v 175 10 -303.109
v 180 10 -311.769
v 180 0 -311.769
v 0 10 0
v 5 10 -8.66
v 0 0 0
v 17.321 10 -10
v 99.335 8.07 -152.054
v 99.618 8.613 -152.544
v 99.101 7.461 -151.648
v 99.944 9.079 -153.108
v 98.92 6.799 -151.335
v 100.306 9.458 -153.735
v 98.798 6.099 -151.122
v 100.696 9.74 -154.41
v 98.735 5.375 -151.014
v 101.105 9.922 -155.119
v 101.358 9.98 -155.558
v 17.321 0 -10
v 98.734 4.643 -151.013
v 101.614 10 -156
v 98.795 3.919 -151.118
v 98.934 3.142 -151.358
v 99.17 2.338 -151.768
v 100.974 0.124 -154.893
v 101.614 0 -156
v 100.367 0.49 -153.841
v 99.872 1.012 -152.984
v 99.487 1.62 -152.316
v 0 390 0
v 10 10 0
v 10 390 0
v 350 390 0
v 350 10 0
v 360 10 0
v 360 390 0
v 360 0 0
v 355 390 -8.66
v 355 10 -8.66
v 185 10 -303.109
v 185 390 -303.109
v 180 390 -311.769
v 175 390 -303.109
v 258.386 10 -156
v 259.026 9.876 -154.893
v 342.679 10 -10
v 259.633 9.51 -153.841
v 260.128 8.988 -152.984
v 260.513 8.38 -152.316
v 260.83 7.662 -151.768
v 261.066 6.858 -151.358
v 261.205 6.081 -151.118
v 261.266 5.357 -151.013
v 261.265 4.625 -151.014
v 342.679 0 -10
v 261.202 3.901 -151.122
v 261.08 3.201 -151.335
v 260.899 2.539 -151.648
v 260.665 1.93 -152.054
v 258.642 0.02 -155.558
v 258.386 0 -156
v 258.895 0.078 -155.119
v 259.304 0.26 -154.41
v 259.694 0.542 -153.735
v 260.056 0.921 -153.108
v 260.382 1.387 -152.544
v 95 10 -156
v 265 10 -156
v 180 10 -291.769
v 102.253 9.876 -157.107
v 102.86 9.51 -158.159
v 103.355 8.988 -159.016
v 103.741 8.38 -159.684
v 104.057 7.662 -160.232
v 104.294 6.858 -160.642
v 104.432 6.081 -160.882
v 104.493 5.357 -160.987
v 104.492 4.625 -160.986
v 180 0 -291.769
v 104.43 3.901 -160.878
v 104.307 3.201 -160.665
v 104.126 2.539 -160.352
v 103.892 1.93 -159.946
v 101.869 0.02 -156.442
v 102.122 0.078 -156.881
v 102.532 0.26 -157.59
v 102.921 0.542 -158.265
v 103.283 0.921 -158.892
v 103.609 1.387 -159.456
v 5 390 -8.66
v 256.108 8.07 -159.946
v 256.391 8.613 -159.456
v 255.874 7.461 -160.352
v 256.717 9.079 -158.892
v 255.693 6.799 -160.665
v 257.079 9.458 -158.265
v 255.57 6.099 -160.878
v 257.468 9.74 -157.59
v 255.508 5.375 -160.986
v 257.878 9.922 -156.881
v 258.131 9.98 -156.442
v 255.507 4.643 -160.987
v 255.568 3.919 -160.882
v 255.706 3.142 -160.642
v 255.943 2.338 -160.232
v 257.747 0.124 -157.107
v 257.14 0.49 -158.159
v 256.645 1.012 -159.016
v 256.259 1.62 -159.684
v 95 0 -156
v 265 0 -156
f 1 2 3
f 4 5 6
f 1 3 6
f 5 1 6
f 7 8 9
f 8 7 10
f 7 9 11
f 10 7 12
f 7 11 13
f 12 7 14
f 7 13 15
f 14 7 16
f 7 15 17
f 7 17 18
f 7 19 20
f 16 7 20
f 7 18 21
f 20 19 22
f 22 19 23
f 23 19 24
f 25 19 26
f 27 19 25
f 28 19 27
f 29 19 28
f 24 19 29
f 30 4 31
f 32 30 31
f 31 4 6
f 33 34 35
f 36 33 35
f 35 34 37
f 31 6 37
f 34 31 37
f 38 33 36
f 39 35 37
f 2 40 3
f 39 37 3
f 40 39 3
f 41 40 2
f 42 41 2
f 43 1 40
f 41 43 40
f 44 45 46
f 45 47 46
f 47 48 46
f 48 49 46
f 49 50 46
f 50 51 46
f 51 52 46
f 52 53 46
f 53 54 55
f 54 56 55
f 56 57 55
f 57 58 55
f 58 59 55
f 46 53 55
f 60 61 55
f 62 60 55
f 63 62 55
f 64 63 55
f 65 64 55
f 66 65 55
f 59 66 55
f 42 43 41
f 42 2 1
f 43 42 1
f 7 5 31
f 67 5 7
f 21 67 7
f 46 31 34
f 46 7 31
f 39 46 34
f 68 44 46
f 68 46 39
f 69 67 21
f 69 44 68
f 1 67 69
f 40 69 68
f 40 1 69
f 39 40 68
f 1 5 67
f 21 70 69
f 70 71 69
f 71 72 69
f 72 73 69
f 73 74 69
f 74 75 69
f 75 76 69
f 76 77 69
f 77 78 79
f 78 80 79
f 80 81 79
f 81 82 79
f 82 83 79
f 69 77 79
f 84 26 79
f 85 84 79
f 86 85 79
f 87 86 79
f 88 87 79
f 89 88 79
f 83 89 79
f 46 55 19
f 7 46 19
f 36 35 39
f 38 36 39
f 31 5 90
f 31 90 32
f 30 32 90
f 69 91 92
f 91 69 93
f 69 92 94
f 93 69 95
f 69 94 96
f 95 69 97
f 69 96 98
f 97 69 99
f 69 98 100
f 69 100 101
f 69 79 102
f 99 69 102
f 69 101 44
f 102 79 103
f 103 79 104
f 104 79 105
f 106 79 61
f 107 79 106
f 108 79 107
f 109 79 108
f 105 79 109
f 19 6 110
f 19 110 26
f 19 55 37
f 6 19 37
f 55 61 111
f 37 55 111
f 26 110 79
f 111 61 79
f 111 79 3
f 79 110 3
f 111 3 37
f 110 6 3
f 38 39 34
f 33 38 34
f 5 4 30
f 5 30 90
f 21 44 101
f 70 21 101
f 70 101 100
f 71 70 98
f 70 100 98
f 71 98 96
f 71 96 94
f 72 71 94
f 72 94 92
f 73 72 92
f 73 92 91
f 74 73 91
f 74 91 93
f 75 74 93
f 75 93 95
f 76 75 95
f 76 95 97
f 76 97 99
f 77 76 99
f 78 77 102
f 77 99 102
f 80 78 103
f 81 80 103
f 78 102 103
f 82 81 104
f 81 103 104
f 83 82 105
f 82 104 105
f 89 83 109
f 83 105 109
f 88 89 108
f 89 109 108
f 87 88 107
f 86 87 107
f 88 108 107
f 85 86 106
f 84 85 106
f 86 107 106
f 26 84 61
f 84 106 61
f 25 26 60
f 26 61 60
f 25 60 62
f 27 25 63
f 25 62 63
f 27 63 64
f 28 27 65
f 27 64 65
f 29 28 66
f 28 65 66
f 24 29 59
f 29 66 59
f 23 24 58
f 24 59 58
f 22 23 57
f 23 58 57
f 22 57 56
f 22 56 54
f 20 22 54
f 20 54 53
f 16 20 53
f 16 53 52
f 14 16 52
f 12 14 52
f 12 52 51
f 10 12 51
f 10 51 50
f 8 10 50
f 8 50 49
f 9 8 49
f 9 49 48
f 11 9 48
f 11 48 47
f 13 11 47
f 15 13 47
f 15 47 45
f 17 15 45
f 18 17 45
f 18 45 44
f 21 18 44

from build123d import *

# Parameters (mm, degrees)
EXTRUDE_1_DEPTH      = 10
EXTRUDE_2_DEPTH      = 380
CUT_EXTRUDE_1_DEPTH  = 10
EXTRUDE_3_DEPTH      = 85
EXTRUDE_3_DEPTH_BACK = 85
SKETCH_5_R           = 5


with BuildPart() as part:
    # 草图1 → 凸台-拉伸1 (new body)
    with BuildSketch(Plane(origin=(0, 0, 0), x_dir=(1, 0, 0), z_dir=(0, 1, 0))):
        Polygon((0, 0), (360, 0), (180, 311.769145362), align=None)
    extrude(amount=EXTRUDE_1_DEPTH)

    # 草图2 → 凸台-拉伸2 (add)
    with BuildSketch(Plane(origin=(0, 10, 0), x_dir=(1, 0, 0), z_dir=(0, 1, 0))):
        Polygon((360, 0), (355, 8.660254038), (350, 0), align=None)
        Polygon((0, 0), (5, 8.660254038), (10, 0), align=None)
        Polygon((180, 311.769145362), (175, 303.108891325), (185, 303.108891325), align=None)
    extrude(amount=EXTRUDE_2_DEPTH)

    # 草图4 → 切除-拉伸1 (cut)
    with BuildSketch(Plane(origin=(0, 0, 0), x_dir=(-1, 0, 0), z_dir=(0, -1, 0))):
        Polygon((-180, 291.769145362), (-342.679491924, 10), (-17.320508076, 10), align=None)
    extrude(amount=-CUT_EXTRUDE_1_DEPTH, mode=Mode.SUBTRACT)

    # 草图5 → 凸台-拉伸3 (add, two sides: drawn at the far end of the back side and taken through both)
    with BuildSketch(Plane.ZY.offset(-180).offset(-EXTRUDE_3_DEPTH_BACK)):
        with Locations((-156, 5)):
            Circle(SKETCH_5_R)
    extrude(amount=EXTRUDE_3_DEPTH + EXTRUDE_3_DEPTH_BACK)


solid = part.part
